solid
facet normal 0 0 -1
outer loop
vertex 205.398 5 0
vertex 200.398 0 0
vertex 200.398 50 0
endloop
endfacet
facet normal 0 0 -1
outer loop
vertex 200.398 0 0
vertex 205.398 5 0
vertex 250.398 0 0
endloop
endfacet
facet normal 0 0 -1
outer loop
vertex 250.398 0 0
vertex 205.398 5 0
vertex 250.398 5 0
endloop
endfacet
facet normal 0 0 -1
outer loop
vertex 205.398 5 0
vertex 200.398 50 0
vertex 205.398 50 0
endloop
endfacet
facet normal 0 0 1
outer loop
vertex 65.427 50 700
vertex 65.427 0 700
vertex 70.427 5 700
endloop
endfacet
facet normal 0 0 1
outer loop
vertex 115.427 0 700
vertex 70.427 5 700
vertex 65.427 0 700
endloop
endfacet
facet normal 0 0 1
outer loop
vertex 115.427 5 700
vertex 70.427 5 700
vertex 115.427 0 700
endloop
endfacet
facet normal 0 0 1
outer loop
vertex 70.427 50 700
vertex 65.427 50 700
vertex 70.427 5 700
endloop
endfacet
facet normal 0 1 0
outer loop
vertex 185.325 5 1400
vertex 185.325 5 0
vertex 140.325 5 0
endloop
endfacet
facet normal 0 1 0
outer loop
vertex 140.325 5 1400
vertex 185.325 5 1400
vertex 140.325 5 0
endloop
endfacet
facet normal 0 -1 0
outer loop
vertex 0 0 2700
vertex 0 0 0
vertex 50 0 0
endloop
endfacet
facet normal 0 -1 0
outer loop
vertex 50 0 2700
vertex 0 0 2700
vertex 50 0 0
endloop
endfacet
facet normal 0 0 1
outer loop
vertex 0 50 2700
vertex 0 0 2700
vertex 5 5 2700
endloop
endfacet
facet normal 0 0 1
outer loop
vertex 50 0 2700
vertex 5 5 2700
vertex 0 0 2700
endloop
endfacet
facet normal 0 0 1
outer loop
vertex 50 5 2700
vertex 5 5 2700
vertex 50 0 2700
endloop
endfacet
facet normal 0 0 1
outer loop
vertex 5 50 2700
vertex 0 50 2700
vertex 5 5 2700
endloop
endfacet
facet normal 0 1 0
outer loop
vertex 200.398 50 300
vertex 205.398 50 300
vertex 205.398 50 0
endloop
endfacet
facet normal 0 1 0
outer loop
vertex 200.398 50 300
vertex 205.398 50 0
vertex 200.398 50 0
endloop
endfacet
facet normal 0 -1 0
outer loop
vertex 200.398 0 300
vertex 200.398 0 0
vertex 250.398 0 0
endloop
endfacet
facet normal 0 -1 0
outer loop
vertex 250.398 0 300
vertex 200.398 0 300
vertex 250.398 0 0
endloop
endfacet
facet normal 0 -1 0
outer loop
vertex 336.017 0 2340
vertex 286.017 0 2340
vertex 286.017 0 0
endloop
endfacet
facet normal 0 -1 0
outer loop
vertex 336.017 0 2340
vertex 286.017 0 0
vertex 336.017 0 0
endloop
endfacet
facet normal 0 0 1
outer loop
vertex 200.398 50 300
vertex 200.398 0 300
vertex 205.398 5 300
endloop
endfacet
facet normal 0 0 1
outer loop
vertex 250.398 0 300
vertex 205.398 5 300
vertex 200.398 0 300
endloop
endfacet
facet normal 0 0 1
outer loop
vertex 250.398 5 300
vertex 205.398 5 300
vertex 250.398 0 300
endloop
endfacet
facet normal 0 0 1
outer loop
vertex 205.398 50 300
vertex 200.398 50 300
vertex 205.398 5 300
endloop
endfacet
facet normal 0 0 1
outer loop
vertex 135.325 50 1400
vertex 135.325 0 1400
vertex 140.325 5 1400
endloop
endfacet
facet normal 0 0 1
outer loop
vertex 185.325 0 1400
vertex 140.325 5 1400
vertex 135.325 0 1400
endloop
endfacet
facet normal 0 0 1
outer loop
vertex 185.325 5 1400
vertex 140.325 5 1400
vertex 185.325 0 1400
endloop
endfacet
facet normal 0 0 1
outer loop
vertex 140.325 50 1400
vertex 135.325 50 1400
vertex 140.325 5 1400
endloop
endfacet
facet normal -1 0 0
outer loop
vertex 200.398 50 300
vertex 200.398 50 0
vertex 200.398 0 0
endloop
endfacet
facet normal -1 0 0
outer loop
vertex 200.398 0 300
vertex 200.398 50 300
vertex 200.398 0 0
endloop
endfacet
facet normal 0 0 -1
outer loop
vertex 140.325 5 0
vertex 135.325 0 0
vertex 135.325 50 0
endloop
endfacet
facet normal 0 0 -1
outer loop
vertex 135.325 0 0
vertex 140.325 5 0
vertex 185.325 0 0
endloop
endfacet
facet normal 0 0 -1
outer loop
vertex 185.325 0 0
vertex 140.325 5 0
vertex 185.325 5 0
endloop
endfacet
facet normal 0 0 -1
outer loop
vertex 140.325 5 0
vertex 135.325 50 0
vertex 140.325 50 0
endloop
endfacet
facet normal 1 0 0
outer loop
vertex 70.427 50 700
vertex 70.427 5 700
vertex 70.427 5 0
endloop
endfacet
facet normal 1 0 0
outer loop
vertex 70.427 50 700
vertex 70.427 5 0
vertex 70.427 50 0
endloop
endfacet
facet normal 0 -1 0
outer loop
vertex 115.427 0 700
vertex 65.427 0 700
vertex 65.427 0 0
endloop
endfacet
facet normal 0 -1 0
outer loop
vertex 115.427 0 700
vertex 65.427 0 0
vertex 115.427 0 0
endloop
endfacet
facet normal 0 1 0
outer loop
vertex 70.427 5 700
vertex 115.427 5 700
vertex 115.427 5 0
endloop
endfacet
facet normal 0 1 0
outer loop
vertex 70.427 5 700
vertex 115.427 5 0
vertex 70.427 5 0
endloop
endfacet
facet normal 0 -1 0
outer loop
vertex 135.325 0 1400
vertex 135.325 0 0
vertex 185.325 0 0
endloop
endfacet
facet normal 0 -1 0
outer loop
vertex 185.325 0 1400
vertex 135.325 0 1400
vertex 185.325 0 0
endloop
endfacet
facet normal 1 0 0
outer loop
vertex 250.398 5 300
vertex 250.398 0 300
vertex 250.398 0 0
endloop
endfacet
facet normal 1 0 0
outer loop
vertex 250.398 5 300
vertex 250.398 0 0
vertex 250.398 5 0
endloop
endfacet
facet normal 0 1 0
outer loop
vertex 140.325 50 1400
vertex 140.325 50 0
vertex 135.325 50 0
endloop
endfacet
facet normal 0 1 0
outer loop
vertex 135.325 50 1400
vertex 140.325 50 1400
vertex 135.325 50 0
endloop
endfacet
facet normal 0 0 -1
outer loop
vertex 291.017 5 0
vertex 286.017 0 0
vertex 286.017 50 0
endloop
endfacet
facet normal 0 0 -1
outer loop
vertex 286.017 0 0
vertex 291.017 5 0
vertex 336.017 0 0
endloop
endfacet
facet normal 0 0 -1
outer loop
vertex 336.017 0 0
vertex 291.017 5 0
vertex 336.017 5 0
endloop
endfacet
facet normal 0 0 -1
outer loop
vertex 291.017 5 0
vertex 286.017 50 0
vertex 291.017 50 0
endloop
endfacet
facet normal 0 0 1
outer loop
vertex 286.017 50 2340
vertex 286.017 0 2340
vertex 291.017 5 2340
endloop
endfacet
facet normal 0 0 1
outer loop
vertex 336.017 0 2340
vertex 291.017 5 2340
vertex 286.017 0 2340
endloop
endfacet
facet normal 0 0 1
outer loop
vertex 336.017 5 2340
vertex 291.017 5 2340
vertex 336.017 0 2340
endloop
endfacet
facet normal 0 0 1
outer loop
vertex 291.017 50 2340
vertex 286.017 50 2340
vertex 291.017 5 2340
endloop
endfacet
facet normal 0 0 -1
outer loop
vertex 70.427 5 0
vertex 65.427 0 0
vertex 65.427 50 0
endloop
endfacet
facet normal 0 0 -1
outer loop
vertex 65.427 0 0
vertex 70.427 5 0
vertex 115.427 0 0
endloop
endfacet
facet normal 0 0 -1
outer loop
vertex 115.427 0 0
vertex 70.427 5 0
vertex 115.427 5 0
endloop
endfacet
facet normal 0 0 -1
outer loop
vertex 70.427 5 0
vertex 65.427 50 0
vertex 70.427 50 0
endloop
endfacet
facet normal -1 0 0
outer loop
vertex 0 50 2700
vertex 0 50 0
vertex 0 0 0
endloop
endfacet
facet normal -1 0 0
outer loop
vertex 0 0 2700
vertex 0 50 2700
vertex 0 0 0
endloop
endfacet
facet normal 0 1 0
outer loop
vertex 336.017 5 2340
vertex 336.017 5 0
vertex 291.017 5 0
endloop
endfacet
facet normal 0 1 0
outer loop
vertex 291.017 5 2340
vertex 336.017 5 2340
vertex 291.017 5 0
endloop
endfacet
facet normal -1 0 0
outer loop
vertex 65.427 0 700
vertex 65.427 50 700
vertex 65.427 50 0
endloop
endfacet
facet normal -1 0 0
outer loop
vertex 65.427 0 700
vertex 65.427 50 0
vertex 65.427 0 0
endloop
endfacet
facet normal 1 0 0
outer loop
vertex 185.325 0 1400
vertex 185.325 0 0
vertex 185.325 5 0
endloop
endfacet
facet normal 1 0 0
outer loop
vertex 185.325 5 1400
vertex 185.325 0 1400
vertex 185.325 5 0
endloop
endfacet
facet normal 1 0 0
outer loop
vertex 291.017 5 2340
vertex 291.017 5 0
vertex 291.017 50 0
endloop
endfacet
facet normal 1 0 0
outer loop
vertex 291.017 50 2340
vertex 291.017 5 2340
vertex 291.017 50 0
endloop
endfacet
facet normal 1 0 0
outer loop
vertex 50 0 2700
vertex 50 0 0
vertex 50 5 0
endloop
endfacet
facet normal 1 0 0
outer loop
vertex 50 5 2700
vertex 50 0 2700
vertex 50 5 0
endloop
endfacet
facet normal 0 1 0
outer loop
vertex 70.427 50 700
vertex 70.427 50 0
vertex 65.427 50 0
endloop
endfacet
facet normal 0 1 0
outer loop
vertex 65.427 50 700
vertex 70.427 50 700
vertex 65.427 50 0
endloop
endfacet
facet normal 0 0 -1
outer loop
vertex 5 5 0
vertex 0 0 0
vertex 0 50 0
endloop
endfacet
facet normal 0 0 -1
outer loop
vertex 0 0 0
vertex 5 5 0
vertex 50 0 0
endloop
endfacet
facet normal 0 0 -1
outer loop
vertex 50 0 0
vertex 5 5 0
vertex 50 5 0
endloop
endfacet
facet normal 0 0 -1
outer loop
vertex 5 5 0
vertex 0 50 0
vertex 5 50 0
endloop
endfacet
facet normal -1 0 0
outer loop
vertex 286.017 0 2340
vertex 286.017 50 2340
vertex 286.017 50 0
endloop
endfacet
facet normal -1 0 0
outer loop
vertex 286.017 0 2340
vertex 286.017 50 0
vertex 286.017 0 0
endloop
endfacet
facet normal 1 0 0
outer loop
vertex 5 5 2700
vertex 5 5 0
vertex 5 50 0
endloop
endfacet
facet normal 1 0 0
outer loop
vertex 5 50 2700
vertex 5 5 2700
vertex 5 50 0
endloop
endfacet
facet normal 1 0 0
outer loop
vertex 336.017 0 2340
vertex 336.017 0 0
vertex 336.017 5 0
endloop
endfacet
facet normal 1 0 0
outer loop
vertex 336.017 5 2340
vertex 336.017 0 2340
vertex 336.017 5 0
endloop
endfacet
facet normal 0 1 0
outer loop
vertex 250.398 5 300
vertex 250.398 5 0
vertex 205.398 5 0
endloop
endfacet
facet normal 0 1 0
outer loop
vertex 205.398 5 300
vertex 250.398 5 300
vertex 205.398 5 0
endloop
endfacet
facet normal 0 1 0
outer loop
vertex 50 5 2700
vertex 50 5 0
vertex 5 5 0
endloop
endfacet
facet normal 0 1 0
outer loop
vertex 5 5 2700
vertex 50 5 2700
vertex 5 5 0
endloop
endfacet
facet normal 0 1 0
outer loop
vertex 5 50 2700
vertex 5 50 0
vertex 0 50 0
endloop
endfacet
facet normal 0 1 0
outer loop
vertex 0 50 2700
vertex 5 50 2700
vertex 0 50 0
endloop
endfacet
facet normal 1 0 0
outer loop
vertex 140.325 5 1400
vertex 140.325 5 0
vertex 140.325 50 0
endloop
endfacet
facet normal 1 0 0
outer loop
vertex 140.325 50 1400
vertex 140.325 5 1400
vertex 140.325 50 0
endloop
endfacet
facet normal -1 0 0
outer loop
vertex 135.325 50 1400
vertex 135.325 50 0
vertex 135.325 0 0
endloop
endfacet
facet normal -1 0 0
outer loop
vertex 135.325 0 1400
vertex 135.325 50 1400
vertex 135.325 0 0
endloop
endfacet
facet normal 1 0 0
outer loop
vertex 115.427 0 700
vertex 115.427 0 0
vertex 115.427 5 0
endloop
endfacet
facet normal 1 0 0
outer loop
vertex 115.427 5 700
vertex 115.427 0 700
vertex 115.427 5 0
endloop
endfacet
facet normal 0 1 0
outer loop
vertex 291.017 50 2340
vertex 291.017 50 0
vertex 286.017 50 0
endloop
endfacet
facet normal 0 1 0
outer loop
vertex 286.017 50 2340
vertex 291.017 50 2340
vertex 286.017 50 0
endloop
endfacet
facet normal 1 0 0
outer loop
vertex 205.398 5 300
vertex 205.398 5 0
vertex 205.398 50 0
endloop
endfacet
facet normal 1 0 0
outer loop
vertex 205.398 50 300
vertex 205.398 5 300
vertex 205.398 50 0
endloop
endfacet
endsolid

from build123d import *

# Parameters (mm, degrees)
F1_DEPTH = 2700
F3_DEPTH = 700
F6_DEPTH = 1400
F7_DEPTH = 300
F9_DEPTH = 2340


with BuildPart() as f1:
    # F0 (on Top) → F1 (new body)
    with BuildSketch(Plane.XY):
        Polygon((0, 50), (0, 0), (50, 0), (50, 5), (5, 5), (5, 50), align=None)
    extrude(amount=F1_DEPTH)


with BuildPart() as f3:
    # F2 (on Top) → F3 (new body)
    with BuildSketch(Plane.XY):
        Polygon((65.427296, 50), (65.427296, 0), (115.427296, 0), (115.427296, 5), (70.427296, 5), (70.427296, 50), align=None)
    extrude(amount=F3_DEPTH)


with BuildPart() as f6:
    # F4 (on Top) → F6 (new body)
    with BuildSketch(Plane.XY):
        Polygon((135.325179, 50), (135.325179, 0), (185.325179, 0), (185.325179, 5), (140.325179, 5), (140.325179, 50), align=None)
    extrude(amount=F6_DEPTH)


with BuildPart() as f7:
    # F5 (on Top) → F7 (new body)
    with BuildSketch(Plane.XY):
        Polygon((200.397983, 50), (200.397983, 0), (250.397983, 0), (250.397983, 5), (205.397983, 5), (205.397983, 50), align=None)
    extrude(amount=F7_DEPTH)


with BuildPart() as f9:
    # F8 (on Top) → F9 (new body)
    with BuildSketch(Plane.XY):
        Polygon((286.016911, 50), (286.016911, 0), (336.016911, 0), (336.016911, 5), (291.016911, 5), (291.016911, 50), align=None)
    extrude(amount=F9_DEPTH)


solid = Compound([f1.part, f3.part, f6.part, f7.part, f9.part])
